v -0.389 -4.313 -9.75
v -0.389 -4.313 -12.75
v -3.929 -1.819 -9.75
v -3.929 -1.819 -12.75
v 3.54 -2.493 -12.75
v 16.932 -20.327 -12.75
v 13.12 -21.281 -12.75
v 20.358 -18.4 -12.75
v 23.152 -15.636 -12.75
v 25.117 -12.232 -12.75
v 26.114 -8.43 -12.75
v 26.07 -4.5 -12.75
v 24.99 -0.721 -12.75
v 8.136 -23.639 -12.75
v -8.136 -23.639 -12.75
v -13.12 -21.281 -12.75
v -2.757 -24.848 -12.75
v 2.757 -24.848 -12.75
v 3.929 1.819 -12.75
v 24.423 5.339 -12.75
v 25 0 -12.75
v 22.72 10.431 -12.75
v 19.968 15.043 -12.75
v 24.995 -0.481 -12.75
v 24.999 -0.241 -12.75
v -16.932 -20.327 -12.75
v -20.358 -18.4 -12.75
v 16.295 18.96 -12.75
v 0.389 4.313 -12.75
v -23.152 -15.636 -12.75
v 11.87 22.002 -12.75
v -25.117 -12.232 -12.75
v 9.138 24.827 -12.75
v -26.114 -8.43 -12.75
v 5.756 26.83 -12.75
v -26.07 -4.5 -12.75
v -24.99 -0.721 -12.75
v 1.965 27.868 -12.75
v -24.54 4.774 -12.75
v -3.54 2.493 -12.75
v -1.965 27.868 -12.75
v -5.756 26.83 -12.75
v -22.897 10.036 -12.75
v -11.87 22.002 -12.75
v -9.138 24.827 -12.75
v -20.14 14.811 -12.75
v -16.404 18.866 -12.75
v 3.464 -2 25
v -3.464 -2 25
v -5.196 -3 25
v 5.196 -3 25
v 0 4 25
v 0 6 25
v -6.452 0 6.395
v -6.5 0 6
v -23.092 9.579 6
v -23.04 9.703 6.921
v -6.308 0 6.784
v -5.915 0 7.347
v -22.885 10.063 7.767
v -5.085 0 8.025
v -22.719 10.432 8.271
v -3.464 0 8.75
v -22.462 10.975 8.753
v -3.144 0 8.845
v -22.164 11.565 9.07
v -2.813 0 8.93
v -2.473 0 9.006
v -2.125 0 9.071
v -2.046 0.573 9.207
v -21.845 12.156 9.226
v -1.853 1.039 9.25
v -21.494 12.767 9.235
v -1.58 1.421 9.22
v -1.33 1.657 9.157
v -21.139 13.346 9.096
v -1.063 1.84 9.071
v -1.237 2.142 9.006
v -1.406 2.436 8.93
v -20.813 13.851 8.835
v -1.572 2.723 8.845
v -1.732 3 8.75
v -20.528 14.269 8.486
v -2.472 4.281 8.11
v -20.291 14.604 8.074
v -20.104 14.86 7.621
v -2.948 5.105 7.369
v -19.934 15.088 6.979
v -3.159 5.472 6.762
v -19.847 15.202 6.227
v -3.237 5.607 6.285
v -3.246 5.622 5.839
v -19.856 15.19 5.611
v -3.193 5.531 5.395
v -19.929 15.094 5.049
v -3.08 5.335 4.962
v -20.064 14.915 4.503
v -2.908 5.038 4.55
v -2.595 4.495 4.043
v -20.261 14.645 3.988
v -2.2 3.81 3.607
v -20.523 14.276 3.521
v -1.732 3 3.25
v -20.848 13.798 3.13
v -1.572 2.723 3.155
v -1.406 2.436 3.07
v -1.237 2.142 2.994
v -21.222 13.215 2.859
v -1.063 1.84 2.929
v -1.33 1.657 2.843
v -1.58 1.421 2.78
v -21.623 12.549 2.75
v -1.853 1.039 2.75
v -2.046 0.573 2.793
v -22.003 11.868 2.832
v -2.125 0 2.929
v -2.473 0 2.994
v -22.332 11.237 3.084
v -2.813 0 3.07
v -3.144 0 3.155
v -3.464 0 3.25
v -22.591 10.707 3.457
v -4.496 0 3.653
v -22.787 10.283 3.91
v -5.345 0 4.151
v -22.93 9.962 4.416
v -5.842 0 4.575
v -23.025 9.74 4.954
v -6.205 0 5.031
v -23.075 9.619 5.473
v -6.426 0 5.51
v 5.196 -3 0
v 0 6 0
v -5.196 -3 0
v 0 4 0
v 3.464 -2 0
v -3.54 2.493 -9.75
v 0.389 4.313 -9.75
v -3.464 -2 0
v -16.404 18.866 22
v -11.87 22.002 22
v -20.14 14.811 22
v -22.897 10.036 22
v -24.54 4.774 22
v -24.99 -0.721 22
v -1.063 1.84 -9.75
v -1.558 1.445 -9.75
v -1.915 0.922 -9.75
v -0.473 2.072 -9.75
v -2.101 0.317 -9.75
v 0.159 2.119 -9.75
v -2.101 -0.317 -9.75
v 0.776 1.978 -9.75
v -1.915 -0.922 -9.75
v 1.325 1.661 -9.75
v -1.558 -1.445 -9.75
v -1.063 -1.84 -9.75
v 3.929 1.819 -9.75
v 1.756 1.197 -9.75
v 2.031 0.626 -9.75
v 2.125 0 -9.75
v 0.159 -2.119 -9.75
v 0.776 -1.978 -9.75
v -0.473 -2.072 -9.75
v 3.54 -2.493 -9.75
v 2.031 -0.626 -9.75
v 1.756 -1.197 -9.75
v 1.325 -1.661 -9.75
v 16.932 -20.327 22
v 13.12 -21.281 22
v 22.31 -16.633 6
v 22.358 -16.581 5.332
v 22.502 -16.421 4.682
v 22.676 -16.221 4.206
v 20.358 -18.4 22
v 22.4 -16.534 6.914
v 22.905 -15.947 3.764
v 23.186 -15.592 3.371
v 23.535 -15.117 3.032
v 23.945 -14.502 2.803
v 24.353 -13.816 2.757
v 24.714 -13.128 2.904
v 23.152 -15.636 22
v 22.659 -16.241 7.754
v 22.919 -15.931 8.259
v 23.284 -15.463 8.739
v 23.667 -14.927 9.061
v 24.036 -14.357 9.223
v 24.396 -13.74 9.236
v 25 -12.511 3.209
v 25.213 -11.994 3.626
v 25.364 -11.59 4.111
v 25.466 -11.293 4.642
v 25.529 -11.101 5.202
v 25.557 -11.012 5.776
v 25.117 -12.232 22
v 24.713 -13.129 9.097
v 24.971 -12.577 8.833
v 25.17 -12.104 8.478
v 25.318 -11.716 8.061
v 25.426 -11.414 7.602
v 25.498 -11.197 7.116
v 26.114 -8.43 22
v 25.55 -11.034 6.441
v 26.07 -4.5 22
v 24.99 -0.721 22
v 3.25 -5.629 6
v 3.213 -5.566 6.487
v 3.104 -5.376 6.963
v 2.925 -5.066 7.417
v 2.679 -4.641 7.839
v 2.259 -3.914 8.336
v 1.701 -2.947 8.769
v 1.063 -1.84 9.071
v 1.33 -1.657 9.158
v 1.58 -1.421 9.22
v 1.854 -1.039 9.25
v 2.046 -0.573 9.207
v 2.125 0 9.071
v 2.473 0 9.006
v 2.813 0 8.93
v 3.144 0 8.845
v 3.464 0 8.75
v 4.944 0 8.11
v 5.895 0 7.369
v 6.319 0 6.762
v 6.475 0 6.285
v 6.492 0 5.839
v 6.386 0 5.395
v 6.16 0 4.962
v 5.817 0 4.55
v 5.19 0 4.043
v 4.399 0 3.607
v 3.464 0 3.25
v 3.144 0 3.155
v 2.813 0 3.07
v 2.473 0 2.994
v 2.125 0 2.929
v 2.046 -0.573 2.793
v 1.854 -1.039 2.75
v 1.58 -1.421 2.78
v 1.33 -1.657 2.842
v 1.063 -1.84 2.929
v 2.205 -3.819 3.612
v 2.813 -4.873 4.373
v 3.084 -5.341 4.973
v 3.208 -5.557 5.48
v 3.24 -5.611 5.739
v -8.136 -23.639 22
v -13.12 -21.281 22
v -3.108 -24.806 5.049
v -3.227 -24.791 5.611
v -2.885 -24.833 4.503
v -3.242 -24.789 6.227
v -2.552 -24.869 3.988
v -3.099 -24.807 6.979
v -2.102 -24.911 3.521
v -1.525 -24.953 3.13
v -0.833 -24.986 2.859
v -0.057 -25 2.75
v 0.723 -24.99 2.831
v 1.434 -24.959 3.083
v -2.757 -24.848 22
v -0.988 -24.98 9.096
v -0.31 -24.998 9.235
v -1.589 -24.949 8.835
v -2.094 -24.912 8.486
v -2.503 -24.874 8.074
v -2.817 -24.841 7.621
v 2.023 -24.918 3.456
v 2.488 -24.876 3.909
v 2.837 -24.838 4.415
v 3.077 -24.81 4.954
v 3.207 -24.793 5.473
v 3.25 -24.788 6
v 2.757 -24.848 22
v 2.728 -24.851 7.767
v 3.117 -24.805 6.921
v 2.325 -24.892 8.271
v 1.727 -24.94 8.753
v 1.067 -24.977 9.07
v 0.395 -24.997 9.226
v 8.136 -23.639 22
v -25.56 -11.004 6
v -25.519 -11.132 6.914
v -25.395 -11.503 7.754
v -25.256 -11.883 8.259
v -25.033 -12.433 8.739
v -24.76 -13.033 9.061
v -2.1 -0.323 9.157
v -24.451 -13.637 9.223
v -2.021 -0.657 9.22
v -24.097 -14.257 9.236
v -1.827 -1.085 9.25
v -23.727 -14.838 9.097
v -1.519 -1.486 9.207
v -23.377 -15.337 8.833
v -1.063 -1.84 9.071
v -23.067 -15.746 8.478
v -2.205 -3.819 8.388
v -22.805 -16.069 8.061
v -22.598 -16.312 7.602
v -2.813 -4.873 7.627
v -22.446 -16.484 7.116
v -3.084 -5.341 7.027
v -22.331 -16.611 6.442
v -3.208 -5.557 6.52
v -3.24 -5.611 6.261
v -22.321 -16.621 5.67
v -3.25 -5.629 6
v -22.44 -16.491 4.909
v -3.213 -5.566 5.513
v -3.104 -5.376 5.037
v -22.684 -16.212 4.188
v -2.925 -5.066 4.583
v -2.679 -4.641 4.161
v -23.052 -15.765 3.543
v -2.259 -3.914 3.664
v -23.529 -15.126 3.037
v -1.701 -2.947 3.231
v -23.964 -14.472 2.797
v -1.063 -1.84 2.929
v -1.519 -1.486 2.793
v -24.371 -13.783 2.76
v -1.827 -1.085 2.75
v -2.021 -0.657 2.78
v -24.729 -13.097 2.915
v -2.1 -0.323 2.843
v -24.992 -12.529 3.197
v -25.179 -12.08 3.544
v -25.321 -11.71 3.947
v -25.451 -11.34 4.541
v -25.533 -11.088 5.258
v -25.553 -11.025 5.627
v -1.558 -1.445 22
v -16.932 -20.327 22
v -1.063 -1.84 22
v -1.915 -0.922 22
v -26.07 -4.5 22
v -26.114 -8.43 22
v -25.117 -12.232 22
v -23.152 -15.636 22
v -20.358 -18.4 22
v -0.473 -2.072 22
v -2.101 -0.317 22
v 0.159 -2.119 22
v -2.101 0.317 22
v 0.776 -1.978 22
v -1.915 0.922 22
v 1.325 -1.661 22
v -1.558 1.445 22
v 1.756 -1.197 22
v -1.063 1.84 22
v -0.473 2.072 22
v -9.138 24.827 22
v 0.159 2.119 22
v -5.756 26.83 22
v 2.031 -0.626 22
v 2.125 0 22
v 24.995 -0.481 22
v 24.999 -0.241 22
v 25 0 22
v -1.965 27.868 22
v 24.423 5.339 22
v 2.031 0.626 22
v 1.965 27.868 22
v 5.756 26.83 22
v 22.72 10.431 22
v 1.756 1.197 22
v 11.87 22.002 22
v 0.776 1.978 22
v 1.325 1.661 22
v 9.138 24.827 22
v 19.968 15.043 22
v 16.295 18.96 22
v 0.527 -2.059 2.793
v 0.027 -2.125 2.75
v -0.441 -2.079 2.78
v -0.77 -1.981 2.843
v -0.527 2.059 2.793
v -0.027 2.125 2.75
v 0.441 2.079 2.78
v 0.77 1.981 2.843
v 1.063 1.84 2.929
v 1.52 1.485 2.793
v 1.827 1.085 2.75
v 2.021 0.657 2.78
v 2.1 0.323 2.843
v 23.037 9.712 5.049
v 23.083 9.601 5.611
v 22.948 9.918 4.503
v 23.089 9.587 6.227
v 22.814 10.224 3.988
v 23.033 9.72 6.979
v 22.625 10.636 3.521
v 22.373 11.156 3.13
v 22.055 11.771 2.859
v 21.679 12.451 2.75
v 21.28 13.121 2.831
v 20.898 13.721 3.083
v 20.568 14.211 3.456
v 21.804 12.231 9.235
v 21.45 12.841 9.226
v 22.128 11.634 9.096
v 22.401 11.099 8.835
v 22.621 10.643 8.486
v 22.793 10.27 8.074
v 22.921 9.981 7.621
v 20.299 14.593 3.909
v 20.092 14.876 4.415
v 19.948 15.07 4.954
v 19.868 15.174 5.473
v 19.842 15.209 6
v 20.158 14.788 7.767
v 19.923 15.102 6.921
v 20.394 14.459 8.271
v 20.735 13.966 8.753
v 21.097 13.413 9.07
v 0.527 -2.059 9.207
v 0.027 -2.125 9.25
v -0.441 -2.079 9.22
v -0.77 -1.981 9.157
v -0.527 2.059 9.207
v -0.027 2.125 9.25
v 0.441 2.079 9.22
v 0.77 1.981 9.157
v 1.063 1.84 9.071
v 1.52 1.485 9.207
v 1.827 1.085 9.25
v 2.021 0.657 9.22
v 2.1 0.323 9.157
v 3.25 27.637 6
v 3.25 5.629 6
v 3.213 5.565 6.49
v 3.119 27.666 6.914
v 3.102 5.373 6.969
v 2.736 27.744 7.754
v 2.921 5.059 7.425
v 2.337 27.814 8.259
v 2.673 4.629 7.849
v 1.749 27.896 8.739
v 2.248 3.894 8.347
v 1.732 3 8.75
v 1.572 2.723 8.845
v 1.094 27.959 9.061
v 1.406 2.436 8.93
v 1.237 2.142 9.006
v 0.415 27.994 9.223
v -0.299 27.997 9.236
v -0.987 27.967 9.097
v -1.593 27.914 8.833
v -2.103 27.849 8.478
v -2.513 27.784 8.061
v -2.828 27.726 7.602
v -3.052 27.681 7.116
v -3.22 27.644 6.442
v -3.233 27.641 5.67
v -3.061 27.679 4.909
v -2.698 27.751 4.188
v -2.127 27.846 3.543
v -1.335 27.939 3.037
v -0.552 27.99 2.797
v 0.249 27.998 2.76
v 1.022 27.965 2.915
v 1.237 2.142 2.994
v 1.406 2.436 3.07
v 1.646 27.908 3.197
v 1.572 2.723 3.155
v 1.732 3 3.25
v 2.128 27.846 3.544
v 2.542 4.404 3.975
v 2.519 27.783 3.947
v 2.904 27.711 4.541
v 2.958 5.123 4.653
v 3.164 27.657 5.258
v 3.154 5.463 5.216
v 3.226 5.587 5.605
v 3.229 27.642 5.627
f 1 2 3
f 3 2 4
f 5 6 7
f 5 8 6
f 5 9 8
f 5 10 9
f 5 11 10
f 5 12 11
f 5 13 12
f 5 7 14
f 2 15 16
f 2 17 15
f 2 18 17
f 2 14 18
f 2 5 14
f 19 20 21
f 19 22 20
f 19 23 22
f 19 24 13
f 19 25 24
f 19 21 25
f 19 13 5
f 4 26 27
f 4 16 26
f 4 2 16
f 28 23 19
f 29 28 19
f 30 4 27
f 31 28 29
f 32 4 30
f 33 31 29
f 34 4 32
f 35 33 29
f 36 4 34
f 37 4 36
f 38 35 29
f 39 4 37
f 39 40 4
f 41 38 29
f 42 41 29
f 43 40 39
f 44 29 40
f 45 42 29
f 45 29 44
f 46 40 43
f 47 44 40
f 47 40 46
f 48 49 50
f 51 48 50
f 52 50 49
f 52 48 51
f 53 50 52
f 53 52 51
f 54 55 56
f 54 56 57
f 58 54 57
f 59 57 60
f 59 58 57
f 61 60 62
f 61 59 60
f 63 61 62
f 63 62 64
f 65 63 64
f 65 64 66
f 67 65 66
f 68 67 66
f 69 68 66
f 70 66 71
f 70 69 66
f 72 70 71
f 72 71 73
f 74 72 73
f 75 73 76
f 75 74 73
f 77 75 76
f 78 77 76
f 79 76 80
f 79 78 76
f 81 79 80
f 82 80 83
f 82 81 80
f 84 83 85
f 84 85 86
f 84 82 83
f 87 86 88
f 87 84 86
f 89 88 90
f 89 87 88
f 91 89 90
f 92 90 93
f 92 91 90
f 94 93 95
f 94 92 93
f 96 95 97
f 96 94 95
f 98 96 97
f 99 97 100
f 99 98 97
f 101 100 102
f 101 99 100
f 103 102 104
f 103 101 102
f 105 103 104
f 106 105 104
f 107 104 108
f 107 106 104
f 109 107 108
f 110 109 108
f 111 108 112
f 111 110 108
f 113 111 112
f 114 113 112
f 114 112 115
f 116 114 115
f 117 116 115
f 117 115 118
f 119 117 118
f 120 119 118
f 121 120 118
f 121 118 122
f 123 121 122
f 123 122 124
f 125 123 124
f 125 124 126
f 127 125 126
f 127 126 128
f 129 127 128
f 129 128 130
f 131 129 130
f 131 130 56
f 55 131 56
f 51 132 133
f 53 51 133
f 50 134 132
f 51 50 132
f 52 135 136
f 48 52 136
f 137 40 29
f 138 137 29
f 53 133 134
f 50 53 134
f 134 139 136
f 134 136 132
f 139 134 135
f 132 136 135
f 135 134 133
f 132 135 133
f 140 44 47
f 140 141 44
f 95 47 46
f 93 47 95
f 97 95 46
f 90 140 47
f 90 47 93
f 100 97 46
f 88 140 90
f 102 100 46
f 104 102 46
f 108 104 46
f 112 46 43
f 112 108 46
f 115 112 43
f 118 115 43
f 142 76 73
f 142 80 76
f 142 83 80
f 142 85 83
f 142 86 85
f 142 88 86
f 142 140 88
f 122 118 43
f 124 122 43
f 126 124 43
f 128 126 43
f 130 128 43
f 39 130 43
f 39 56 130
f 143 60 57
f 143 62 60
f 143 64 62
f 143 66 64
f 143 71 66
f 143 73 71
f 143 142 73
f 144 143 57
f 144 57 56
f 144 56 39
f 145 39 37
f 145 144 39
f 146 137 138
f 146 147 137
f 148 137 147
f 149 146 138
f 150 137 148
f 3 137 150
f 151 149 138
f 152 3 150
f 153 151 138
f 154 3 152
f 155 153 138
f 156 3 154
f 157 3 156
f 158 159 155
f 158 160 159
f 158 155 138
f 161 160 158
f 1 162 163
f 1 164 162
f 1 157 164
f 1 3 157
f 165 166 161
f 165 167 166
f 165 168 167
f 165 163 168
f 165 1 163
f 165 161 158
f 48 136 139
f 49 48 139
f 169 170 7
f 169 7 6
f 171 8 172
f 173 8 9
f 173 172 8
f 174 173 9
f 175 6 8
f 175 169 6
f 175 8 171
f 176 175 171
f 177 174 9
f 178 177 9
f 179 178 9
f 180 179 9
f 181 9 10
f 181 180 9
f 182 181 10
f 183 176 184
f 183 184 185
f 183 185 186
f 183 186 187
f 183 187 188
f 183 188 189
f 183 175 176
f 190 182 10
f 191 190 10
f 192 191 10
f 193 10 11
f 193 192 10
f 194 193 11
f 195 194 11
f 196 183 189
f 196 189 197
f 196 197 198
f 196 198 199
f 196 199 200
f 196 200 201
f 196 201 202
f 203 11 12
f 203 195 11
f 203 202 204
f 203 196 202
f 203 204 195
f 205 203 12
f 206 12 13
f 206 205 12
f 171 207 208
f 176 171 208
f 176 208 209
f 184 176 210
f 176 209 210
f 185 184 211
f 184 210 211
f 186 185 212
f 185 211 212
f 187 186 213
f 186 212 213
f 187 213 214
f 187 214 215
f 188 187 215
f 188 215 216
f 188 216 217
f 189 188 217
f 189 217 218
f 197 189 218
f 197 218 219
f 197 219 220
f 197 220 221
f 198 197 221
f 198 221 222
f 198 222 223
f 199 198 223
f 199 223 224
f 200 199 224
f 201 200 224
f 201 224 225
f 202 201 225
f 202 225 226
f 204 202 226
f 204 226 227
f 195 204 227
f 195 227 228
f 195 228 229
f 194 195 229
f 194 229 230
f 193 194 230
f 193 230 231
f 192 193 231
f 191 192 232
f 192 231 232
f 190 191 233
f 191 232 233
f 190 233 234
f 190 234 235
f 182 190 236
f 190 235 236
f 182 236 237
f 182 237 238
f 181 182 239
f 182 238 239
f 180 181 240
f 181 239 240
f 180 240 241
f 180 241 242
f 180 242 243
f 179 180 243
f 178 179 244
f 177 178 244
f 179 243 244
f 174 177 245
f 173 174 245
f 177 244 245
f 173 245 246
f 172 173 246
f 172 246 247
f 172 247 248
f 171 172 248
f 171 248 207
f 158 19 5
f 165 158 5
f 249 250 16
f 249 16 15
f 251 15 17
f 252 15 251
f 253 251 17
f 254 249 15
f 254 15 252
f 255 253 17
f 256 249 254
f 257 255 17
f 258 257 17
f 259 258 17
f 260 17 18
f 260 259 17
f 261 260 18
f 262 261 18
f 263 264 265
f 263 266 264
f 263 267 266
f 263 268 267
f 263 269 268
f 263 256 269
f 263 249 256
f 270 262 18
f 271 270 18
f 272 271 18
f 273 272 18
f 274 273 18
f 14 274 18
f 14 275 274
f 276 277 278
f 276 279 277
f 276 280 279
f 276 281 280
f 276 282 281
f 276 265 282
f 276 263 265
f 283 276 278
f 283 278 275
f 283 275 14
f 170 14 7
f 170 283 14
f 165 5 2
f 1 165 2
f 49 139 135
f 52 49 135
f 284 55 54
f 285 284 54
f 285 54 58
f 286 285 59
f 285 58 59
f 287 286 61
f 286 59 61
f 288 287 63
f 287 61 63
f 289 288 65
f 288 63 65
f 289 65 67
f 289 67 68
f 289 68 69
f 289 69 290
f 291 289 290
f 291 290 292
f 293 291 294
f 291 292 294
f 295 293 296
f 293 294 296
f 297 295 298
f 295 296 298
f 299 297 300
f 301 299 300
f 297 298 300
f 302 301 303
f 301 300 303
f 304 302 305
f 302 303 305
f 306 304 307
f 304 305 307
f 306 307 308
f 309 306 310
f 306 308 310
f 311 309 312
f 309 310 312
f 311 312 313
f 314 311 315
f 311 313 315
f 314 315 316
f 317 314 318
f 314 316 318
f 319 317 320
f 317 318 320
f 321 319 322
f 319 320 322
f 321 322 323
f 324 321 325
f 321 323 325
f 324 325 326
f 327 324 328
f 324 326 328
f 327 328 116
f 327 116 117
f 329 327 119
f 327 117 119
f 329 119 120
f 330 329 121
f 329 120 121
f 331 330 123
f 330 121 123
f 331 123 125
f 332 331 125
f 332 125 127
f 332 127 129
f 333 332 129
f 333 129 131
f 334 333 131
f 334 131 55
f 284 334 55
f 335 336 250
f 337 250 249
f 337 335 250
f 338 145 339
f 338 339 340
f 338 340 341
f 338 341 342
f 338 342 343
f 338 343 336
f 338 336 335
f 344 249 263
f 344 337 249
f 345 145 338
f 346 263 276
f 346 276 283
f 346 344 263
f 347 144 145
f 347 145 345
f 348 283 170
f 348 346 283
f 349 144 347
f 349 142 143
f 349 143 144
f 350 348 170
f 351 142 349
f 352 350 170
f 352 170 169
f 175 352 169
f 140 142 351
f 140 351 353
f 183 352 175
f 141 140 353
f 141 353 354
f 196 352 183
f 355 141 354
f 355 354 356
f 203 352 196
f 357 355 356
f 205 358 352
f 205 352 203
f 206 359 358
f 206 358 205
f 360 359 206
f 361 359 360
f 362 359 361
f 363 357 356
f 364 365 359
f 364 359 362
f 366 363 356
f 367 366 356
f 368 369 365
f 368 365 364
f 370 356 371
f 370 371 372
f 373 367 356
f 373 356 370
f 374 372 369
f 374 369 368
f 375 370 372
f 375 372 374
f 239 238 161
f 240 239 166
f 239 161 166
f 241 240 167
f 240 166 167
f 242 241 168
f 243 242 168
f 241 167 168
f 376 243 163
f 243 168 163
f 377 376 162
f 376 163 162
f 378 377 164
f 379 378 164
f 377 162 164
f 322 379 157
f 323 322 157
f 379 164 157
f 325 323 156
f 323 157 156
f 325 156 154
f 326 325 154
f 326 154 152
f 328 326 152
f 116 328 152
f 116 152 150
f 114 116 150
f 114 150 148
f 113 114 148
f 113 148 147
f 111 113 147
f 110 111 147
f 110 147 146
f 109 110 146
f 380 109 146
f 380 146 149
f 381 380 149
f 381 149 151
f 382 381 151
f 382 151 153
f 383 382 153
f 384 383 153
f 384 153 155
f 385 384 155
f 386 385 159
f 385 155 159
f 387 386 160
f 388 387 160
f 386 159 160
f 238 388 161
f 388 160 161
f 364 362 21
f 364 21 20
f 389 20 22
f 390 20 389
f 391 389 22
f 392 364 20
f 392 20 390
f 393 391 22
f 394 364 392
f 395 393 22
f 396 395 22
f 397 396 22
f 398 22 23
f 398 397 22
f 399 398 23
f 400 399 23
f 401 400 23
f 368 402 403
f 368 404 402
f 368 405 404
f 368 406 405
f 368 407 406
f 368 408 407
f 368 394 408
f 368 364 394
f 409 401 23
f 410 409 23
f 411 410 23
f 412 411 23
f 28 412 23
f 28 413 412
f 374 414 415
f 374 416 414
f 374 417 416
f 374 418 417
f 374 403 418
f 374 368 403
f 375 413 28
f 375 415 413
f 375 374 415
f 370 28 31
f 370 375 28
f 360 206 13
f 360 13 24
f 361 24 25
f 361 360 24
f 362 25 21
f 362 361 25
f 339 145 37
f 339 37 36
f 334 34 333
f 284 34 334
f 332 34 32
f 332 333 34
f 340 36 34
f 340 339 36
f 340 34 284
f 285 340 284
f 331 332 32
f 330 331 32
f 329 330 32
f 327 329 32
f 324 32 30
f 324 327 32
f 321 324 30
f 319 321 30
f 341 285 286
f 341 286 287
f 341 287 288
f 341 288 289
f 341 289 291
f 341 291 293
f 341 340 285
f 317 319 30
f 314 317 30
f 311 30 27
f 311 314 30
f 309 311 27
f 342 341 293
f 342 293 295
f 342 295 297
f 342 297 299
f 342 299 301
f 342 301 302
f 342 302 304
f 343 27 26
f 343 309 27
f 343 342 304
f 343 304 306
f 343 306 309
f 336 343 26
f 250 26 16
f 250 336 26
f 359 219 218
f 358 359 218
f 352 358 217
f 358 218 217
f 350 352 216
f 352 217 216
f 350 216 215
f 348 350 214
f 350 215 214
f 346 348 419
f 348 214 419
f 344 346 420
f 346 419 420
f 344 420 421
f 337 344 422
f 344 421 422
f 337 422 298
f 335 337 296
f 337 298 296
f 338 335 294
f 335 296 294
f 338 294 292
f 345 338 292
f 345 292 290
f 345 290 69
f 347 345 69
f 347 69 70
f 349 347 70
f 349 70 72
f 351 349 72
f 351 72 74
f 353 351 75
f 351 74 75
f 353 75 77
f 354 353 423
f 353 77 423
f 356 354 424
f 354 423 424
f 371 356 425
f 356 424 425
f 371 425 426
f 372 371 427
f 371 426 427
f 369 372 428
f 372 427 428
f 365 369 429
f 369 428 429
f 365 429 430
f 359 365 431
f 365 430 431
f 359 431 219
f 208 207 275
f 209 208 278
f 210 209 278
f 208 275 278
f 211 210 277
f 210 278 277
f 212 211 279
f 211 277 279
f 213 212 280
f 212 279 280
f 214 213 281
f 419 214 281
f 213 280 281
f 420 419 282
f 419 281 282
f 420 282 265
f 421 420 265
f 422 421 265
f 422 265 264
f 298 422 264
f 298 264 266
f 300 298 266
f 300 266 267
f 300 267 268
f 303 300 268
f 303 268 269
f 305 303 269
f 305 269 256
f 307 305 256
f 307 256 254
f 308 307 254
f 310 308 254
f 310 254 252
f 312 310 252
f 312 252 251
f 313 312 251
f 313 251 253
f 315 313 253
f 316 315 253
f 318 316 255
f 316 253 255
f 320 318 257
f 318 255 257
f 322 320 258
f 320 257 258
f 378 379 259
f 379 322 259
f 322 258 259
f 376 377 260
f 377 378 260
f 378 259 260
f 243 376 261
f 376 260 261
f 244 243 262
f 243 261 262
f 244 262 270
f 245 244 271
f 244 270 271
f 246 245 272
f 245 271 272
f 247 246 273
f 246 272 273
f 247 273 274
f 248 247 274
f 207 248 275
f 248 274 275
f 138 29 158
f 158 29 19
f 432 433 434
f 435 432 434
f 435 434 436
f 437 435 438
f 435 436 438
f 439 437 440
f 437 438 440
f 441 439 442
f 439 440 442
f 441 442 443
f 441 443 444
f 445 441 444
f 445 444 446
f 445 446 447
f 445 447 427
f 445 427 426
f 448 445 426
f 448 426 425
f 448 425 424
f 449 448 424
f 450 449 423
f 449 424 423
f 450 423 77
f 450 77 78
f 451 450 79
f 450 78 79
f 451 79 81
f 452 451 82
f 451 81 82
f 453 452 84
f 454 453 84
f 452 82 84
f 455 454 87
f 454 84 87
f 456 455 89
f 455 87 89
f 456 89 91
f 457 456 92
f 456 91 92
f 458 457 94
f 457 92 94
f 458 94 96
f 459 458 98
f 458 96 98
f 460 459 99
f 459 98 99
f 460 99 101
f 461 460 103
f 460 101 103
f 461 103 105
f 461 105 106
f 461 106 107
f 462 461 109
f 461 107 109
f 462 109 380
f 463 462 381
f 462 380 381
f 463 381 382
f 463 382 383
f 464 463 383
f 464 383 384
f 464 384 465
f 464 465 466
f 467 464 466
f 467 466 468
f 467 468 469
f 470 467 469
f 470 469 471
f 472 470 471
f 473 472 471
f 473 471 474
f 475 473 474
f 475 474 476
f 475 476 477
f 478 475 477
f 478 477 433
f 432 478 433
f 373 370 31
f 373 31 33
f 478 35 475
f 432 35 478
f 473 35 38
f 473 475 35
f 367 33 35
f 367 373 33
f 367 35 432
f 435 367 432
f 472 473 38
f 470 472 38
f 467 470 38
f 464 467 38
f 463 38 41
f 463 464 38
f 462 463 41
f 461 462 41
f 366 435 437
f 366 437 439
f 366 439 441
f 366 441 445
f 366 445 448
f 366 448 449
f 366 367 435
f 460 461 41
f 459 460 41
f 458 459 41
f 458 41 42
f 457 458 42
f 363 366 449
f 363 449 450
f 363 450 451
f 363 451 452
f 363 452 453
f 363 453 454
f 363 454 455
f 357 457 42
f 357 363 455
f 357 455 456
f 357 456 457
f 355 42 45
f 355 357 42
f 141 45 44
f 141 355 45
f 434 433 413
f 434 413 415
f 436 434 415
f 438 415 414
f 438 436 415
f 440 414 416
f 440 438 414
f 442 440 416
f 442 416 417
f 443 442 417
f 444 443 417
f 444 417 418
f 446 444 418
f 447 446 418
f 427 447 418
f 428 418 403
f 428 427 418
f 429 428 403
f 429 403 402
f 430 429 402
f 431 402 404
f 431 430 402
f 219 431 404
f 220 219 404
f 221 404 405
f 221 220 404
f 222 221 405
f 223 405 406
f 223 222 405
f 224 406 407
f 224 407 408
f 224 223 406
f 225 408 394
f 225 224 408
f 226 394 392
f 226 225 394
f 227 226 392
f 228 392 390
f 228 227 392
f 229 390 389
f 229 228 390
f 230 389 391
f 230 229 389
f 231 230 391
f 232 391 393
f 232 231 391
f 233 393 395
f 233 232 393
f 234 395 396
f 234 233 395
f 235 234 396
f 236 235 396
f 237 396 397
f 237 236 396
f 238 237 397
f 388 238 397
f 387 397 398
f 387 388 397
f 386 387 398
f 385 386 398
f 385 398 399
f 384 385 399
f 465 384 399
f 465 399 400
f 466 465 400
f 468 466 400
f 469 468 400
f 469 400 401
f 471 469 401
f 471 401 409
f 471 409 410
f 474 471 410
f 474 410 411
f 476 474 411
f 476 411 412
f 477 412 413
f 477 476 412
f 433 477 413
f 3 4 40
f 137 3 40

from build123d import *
from build123d import SkipClean  # not in build123d's __all__

# Parameters (mm, degrees)
F1_DEPTH       = 22
F3_R           = 3.25
F4_DEPTH       = 50
F4_DEPTH_BACK  = 50
F6_DEPTH       = 25
F7_R           = 3.25
F8_DEPTH       = 25
F8_DEPTH_BACK  = 40
F9_R           = 3.25
F10_DEPTH      = 25
F10_DEPTH_BACK = 40
F11_DEPTH      = 13.75
F13_DEPTH      = 250
F13_DEPTH_BACK = 250
F14_R          = 2.125
F15_DEPTH      = 100
F16_DEPTH      = 3


# Not quite as in the source:
# - after a boolean that leaves OpenCascade's solid faulty, fix() repairs it
# - a feature names something its author has since deleted; it is built from what else it names


with BuildPart() as f1:
    # F0 (on Top) → F1 (new body)
    with BuildSketch(Plane.XY):
        with BuildLine():
            ThreePointArc((-11.87, 22.002343057), (0, 25), (11.87, 22.002343057))
            ThreePointArc((11.87, 22.002343057), (0, 28), (-11.87, 22.002343057))
        make_face()
        with BuildLine():
            ThreePointArc((-13.1195880302, -21.2808930714), (-21.6506350946, -12.5), (-24.9895880302, -0.7214499856))
            ThreePointArc((-24.9895880302, -0.7214499856), (-24.248711306, -14), (-13.1195880302, -21.2808930714))
        make_face()
        with BuildLine():
            ThreePointArc((13.1195880302, -21.2808930714), (24.248711306, -14), (24.9895880302, -0.7214499856))
            ThreePointArc((24.9895880302, -0.7214499856), (21.6506350946, -12.5), (13.1195880302, -21.2808930714))
        make_face()
        with BuildLine():
            ThreePointArc((24.9895880302, -0.7214499856), (24.997396872, -0.3607625572), (25, 0))
            ThreePointArc((25, 0), (21.467999441, 12.8111279753), (11.87, 22.002343057))
            ThreePointArc((11.87, 22.002343057), (0, 25), (-11.87, 22.002343057))
            ThreePointArc((-11.87, 22.002343057), (-21.6506350946, 12.5), (-24.9895880302, -0.7214499856))
            ThreePointArc((-24.9895880302, -0.7214499856), (-21.6506350946, -12.5), (-13.1195880302, -21.2808930714))
            ThreePointArc((-13.1195880302, -21.2808930714), (0, -25), (13.1195880302, -21.2808930714))
            ThreePointArc((13.1195880302, -21.2808930714), (21.6506350946, -12.5), (24.9895880302, -0.7214499856))
        make_face()
    extrude(amount=F1_DEPTH)

    # F3 (on offset) → F4 (cut, two sides)
    with BuildSketch(Plane.XZ) as f4_sk:
        with Locations((0, 6)):
            Circle(F3_R)
    extrude(amount=F4_DEPTH, mode=Mode.SUBTRACT)
    extrude(f4_sk.sketch, amount=-F4_DEPTH_BACK, mode=Mode.SUBTRACT)

    # F7 (on face) → F8 (cut, two sides)
    with BuildSketch(Plane(origin=(-2.5980762114, 1.5, 0), x_dir=(-0.5, -0.8660254038, 0), z_dir=(-0.8660254038, 0.5, 0))) as f8_sk:
        with Locations((0, 6)):
            Circle(F7_R)
    extrude(amount=F8_DEPTH, mode=Mode.SUBTRACT)
    extrude(f8_sk.sketch, amount=-F8_DEPTH_BACK, mode=Mode.SUBTRACT)

    # F9 (on face) → F10 (cut, two sides)
    with BuildSketch(Plane(origin=(2.5980762114, 1.5, 0), x_dir=(-0.5, 0.8660254038, 0), z_dir=(0.8660254038, 0.5, 0))) as f10_sk:
        with Locations((0, 6)):
            Circle(F9_R)
    extrude(amount=F10_DEPTH, mode=Mode.SUBTRACT)
    extrude(f10_sk.sketch, amount=-F10_DEPTH_BACK, mode=Mode.SUBTRACT)

    # F0 (on Top) → F11 (join)
    with BuildSketch(Plane.XY):
        with BuildLine():
            ThreePointArc((24.9895880302, -0.7214499856), (24.997396872, -0.3607625572), (25, 0))
            ThreePointArc((25, 0), (21.467999441, 12.8111279753), (11.87, 22.002343057))
            ThreePointArc((11.87, 22.002343057), (0, 25), (-11.87, 22.002343057))
            ThreePointArc((-11.87, 22.002343057), (-21.6506350946, 12.5), (-24.9895880302, -0.7214499856))
            ThreePointArc((-24.9895880302, -0.7214499856), (-21.6506350946, -12.5), (-13.1195880302, -21.2808930714))
            ThreePointArc((-13.1195880302, -21.2808930714), (0, -25), (13.1195880302, -21.2808930714))
            ThreePointArc((13.1195880302, -21.2808930714), (21.6506350946, -12.5), (24.9895880302, -0.7214499856))
        make_face()
        with BuildLine():
            ThreePointArc((-11.87, 22.002343057), (0, 25), (11.87, 22.002343057))
            ThreePointArc((11.87, 22.002343057), (0, 28), (-11.87, 22.002343057))
        make_face()
        with BuildLine():
            ThreePointArc((13.1195880302, -21.2808930714), (24.248711306, -14), (24.9895880302, -0.7214499856))
            ThreePointArc((24.9895880302, -0.7214499856), (21.6506350946, -12.5), (13.1195880302, -21.2808930714))
        make_face()
        with BuildLine():
            ThreePointArc((-13.1195880302, -21.2808930714), (-21.6506350946, -12.5), (-24.9895880302, -0.7214499856))
            ThreePointArc((-24.9895880302, -0.7214499856), (-24.248711306, -14), (-13.1195880302, -21.2808930714))
        make_face()
    with SkipClean():  # cleaning this boolean's faces spoils the solid; the shape is the same uncleaned
        extrude(amount=-F11_DEPTH)

    # F12 (on Front) → F13 (cut, two sides)
    with BuildSketch(Plane.XZ) as f13_sk:
        Polygon((-63.1195880302, -13.75), (-13.1195880302, -13.75), (13.1195880302, -13.75), (63.1195880302, -13.75), (63.1195880302, -12.75), (0, -12.75), (-63.1195880302, -12.75), align=None)
    extrude(amount=-F13_DEPTH, mode=Mode.SUBTRACT)
    extrude(f13_sk.sketch, amount=F13_DEPTH_BACK, mode=Mode.SUBTRACT)

    add(f1.part.fix(), mode=Mode.REPLACE)

    # F14 (on face) → F15 (cut)
    with BuildSketch(Plane(origin=(0, 0, -12.75), x_dir=(1, 0, 0), z_dir=(0, 0, -1))):
        Circle(F14_R)
    extrude(amount=-F15_DEPTH, mode=Mode.SUBTRACT)

    # F14 (on face) → F16 (cut)
    with BuildSketch(Plane(origin=(0, 0, -12.75), x_dir=(1, 0, 0), z_dir=(0, 0, -1))):
        Polygon((0.3890172707, -4.3126170202), (3.9293445317, -1.8194096711), (3.5403272609, 2.4932073491), (-0.3890172707, 4.3126170202), (-3.9293445317, 1.8194096711), (-3.5403272609, -2.4932073491), align=None)
        Circle(F14_R, mode=Mode.SUBTRACT)
    extrude(amount=-F16_DEPTH, mode=Mode.SUBTRACT)


with BuildPart() as f6:
    # F5 (on Top) → F6 (new body)
    with BuildSketch(Plane.XY):
        Polygon((-5.1961524227, -3), (5.1961524227, -3), (0, 6), align=None)
        Polygon((0, 4), (3.4641016151, -2), (-3.4641016151, -2), align=None, mode=Mode.SUBTRACT)
    extrude(amount=F6_DEPTH)


solid = Compound([f1.part, f6.part])
